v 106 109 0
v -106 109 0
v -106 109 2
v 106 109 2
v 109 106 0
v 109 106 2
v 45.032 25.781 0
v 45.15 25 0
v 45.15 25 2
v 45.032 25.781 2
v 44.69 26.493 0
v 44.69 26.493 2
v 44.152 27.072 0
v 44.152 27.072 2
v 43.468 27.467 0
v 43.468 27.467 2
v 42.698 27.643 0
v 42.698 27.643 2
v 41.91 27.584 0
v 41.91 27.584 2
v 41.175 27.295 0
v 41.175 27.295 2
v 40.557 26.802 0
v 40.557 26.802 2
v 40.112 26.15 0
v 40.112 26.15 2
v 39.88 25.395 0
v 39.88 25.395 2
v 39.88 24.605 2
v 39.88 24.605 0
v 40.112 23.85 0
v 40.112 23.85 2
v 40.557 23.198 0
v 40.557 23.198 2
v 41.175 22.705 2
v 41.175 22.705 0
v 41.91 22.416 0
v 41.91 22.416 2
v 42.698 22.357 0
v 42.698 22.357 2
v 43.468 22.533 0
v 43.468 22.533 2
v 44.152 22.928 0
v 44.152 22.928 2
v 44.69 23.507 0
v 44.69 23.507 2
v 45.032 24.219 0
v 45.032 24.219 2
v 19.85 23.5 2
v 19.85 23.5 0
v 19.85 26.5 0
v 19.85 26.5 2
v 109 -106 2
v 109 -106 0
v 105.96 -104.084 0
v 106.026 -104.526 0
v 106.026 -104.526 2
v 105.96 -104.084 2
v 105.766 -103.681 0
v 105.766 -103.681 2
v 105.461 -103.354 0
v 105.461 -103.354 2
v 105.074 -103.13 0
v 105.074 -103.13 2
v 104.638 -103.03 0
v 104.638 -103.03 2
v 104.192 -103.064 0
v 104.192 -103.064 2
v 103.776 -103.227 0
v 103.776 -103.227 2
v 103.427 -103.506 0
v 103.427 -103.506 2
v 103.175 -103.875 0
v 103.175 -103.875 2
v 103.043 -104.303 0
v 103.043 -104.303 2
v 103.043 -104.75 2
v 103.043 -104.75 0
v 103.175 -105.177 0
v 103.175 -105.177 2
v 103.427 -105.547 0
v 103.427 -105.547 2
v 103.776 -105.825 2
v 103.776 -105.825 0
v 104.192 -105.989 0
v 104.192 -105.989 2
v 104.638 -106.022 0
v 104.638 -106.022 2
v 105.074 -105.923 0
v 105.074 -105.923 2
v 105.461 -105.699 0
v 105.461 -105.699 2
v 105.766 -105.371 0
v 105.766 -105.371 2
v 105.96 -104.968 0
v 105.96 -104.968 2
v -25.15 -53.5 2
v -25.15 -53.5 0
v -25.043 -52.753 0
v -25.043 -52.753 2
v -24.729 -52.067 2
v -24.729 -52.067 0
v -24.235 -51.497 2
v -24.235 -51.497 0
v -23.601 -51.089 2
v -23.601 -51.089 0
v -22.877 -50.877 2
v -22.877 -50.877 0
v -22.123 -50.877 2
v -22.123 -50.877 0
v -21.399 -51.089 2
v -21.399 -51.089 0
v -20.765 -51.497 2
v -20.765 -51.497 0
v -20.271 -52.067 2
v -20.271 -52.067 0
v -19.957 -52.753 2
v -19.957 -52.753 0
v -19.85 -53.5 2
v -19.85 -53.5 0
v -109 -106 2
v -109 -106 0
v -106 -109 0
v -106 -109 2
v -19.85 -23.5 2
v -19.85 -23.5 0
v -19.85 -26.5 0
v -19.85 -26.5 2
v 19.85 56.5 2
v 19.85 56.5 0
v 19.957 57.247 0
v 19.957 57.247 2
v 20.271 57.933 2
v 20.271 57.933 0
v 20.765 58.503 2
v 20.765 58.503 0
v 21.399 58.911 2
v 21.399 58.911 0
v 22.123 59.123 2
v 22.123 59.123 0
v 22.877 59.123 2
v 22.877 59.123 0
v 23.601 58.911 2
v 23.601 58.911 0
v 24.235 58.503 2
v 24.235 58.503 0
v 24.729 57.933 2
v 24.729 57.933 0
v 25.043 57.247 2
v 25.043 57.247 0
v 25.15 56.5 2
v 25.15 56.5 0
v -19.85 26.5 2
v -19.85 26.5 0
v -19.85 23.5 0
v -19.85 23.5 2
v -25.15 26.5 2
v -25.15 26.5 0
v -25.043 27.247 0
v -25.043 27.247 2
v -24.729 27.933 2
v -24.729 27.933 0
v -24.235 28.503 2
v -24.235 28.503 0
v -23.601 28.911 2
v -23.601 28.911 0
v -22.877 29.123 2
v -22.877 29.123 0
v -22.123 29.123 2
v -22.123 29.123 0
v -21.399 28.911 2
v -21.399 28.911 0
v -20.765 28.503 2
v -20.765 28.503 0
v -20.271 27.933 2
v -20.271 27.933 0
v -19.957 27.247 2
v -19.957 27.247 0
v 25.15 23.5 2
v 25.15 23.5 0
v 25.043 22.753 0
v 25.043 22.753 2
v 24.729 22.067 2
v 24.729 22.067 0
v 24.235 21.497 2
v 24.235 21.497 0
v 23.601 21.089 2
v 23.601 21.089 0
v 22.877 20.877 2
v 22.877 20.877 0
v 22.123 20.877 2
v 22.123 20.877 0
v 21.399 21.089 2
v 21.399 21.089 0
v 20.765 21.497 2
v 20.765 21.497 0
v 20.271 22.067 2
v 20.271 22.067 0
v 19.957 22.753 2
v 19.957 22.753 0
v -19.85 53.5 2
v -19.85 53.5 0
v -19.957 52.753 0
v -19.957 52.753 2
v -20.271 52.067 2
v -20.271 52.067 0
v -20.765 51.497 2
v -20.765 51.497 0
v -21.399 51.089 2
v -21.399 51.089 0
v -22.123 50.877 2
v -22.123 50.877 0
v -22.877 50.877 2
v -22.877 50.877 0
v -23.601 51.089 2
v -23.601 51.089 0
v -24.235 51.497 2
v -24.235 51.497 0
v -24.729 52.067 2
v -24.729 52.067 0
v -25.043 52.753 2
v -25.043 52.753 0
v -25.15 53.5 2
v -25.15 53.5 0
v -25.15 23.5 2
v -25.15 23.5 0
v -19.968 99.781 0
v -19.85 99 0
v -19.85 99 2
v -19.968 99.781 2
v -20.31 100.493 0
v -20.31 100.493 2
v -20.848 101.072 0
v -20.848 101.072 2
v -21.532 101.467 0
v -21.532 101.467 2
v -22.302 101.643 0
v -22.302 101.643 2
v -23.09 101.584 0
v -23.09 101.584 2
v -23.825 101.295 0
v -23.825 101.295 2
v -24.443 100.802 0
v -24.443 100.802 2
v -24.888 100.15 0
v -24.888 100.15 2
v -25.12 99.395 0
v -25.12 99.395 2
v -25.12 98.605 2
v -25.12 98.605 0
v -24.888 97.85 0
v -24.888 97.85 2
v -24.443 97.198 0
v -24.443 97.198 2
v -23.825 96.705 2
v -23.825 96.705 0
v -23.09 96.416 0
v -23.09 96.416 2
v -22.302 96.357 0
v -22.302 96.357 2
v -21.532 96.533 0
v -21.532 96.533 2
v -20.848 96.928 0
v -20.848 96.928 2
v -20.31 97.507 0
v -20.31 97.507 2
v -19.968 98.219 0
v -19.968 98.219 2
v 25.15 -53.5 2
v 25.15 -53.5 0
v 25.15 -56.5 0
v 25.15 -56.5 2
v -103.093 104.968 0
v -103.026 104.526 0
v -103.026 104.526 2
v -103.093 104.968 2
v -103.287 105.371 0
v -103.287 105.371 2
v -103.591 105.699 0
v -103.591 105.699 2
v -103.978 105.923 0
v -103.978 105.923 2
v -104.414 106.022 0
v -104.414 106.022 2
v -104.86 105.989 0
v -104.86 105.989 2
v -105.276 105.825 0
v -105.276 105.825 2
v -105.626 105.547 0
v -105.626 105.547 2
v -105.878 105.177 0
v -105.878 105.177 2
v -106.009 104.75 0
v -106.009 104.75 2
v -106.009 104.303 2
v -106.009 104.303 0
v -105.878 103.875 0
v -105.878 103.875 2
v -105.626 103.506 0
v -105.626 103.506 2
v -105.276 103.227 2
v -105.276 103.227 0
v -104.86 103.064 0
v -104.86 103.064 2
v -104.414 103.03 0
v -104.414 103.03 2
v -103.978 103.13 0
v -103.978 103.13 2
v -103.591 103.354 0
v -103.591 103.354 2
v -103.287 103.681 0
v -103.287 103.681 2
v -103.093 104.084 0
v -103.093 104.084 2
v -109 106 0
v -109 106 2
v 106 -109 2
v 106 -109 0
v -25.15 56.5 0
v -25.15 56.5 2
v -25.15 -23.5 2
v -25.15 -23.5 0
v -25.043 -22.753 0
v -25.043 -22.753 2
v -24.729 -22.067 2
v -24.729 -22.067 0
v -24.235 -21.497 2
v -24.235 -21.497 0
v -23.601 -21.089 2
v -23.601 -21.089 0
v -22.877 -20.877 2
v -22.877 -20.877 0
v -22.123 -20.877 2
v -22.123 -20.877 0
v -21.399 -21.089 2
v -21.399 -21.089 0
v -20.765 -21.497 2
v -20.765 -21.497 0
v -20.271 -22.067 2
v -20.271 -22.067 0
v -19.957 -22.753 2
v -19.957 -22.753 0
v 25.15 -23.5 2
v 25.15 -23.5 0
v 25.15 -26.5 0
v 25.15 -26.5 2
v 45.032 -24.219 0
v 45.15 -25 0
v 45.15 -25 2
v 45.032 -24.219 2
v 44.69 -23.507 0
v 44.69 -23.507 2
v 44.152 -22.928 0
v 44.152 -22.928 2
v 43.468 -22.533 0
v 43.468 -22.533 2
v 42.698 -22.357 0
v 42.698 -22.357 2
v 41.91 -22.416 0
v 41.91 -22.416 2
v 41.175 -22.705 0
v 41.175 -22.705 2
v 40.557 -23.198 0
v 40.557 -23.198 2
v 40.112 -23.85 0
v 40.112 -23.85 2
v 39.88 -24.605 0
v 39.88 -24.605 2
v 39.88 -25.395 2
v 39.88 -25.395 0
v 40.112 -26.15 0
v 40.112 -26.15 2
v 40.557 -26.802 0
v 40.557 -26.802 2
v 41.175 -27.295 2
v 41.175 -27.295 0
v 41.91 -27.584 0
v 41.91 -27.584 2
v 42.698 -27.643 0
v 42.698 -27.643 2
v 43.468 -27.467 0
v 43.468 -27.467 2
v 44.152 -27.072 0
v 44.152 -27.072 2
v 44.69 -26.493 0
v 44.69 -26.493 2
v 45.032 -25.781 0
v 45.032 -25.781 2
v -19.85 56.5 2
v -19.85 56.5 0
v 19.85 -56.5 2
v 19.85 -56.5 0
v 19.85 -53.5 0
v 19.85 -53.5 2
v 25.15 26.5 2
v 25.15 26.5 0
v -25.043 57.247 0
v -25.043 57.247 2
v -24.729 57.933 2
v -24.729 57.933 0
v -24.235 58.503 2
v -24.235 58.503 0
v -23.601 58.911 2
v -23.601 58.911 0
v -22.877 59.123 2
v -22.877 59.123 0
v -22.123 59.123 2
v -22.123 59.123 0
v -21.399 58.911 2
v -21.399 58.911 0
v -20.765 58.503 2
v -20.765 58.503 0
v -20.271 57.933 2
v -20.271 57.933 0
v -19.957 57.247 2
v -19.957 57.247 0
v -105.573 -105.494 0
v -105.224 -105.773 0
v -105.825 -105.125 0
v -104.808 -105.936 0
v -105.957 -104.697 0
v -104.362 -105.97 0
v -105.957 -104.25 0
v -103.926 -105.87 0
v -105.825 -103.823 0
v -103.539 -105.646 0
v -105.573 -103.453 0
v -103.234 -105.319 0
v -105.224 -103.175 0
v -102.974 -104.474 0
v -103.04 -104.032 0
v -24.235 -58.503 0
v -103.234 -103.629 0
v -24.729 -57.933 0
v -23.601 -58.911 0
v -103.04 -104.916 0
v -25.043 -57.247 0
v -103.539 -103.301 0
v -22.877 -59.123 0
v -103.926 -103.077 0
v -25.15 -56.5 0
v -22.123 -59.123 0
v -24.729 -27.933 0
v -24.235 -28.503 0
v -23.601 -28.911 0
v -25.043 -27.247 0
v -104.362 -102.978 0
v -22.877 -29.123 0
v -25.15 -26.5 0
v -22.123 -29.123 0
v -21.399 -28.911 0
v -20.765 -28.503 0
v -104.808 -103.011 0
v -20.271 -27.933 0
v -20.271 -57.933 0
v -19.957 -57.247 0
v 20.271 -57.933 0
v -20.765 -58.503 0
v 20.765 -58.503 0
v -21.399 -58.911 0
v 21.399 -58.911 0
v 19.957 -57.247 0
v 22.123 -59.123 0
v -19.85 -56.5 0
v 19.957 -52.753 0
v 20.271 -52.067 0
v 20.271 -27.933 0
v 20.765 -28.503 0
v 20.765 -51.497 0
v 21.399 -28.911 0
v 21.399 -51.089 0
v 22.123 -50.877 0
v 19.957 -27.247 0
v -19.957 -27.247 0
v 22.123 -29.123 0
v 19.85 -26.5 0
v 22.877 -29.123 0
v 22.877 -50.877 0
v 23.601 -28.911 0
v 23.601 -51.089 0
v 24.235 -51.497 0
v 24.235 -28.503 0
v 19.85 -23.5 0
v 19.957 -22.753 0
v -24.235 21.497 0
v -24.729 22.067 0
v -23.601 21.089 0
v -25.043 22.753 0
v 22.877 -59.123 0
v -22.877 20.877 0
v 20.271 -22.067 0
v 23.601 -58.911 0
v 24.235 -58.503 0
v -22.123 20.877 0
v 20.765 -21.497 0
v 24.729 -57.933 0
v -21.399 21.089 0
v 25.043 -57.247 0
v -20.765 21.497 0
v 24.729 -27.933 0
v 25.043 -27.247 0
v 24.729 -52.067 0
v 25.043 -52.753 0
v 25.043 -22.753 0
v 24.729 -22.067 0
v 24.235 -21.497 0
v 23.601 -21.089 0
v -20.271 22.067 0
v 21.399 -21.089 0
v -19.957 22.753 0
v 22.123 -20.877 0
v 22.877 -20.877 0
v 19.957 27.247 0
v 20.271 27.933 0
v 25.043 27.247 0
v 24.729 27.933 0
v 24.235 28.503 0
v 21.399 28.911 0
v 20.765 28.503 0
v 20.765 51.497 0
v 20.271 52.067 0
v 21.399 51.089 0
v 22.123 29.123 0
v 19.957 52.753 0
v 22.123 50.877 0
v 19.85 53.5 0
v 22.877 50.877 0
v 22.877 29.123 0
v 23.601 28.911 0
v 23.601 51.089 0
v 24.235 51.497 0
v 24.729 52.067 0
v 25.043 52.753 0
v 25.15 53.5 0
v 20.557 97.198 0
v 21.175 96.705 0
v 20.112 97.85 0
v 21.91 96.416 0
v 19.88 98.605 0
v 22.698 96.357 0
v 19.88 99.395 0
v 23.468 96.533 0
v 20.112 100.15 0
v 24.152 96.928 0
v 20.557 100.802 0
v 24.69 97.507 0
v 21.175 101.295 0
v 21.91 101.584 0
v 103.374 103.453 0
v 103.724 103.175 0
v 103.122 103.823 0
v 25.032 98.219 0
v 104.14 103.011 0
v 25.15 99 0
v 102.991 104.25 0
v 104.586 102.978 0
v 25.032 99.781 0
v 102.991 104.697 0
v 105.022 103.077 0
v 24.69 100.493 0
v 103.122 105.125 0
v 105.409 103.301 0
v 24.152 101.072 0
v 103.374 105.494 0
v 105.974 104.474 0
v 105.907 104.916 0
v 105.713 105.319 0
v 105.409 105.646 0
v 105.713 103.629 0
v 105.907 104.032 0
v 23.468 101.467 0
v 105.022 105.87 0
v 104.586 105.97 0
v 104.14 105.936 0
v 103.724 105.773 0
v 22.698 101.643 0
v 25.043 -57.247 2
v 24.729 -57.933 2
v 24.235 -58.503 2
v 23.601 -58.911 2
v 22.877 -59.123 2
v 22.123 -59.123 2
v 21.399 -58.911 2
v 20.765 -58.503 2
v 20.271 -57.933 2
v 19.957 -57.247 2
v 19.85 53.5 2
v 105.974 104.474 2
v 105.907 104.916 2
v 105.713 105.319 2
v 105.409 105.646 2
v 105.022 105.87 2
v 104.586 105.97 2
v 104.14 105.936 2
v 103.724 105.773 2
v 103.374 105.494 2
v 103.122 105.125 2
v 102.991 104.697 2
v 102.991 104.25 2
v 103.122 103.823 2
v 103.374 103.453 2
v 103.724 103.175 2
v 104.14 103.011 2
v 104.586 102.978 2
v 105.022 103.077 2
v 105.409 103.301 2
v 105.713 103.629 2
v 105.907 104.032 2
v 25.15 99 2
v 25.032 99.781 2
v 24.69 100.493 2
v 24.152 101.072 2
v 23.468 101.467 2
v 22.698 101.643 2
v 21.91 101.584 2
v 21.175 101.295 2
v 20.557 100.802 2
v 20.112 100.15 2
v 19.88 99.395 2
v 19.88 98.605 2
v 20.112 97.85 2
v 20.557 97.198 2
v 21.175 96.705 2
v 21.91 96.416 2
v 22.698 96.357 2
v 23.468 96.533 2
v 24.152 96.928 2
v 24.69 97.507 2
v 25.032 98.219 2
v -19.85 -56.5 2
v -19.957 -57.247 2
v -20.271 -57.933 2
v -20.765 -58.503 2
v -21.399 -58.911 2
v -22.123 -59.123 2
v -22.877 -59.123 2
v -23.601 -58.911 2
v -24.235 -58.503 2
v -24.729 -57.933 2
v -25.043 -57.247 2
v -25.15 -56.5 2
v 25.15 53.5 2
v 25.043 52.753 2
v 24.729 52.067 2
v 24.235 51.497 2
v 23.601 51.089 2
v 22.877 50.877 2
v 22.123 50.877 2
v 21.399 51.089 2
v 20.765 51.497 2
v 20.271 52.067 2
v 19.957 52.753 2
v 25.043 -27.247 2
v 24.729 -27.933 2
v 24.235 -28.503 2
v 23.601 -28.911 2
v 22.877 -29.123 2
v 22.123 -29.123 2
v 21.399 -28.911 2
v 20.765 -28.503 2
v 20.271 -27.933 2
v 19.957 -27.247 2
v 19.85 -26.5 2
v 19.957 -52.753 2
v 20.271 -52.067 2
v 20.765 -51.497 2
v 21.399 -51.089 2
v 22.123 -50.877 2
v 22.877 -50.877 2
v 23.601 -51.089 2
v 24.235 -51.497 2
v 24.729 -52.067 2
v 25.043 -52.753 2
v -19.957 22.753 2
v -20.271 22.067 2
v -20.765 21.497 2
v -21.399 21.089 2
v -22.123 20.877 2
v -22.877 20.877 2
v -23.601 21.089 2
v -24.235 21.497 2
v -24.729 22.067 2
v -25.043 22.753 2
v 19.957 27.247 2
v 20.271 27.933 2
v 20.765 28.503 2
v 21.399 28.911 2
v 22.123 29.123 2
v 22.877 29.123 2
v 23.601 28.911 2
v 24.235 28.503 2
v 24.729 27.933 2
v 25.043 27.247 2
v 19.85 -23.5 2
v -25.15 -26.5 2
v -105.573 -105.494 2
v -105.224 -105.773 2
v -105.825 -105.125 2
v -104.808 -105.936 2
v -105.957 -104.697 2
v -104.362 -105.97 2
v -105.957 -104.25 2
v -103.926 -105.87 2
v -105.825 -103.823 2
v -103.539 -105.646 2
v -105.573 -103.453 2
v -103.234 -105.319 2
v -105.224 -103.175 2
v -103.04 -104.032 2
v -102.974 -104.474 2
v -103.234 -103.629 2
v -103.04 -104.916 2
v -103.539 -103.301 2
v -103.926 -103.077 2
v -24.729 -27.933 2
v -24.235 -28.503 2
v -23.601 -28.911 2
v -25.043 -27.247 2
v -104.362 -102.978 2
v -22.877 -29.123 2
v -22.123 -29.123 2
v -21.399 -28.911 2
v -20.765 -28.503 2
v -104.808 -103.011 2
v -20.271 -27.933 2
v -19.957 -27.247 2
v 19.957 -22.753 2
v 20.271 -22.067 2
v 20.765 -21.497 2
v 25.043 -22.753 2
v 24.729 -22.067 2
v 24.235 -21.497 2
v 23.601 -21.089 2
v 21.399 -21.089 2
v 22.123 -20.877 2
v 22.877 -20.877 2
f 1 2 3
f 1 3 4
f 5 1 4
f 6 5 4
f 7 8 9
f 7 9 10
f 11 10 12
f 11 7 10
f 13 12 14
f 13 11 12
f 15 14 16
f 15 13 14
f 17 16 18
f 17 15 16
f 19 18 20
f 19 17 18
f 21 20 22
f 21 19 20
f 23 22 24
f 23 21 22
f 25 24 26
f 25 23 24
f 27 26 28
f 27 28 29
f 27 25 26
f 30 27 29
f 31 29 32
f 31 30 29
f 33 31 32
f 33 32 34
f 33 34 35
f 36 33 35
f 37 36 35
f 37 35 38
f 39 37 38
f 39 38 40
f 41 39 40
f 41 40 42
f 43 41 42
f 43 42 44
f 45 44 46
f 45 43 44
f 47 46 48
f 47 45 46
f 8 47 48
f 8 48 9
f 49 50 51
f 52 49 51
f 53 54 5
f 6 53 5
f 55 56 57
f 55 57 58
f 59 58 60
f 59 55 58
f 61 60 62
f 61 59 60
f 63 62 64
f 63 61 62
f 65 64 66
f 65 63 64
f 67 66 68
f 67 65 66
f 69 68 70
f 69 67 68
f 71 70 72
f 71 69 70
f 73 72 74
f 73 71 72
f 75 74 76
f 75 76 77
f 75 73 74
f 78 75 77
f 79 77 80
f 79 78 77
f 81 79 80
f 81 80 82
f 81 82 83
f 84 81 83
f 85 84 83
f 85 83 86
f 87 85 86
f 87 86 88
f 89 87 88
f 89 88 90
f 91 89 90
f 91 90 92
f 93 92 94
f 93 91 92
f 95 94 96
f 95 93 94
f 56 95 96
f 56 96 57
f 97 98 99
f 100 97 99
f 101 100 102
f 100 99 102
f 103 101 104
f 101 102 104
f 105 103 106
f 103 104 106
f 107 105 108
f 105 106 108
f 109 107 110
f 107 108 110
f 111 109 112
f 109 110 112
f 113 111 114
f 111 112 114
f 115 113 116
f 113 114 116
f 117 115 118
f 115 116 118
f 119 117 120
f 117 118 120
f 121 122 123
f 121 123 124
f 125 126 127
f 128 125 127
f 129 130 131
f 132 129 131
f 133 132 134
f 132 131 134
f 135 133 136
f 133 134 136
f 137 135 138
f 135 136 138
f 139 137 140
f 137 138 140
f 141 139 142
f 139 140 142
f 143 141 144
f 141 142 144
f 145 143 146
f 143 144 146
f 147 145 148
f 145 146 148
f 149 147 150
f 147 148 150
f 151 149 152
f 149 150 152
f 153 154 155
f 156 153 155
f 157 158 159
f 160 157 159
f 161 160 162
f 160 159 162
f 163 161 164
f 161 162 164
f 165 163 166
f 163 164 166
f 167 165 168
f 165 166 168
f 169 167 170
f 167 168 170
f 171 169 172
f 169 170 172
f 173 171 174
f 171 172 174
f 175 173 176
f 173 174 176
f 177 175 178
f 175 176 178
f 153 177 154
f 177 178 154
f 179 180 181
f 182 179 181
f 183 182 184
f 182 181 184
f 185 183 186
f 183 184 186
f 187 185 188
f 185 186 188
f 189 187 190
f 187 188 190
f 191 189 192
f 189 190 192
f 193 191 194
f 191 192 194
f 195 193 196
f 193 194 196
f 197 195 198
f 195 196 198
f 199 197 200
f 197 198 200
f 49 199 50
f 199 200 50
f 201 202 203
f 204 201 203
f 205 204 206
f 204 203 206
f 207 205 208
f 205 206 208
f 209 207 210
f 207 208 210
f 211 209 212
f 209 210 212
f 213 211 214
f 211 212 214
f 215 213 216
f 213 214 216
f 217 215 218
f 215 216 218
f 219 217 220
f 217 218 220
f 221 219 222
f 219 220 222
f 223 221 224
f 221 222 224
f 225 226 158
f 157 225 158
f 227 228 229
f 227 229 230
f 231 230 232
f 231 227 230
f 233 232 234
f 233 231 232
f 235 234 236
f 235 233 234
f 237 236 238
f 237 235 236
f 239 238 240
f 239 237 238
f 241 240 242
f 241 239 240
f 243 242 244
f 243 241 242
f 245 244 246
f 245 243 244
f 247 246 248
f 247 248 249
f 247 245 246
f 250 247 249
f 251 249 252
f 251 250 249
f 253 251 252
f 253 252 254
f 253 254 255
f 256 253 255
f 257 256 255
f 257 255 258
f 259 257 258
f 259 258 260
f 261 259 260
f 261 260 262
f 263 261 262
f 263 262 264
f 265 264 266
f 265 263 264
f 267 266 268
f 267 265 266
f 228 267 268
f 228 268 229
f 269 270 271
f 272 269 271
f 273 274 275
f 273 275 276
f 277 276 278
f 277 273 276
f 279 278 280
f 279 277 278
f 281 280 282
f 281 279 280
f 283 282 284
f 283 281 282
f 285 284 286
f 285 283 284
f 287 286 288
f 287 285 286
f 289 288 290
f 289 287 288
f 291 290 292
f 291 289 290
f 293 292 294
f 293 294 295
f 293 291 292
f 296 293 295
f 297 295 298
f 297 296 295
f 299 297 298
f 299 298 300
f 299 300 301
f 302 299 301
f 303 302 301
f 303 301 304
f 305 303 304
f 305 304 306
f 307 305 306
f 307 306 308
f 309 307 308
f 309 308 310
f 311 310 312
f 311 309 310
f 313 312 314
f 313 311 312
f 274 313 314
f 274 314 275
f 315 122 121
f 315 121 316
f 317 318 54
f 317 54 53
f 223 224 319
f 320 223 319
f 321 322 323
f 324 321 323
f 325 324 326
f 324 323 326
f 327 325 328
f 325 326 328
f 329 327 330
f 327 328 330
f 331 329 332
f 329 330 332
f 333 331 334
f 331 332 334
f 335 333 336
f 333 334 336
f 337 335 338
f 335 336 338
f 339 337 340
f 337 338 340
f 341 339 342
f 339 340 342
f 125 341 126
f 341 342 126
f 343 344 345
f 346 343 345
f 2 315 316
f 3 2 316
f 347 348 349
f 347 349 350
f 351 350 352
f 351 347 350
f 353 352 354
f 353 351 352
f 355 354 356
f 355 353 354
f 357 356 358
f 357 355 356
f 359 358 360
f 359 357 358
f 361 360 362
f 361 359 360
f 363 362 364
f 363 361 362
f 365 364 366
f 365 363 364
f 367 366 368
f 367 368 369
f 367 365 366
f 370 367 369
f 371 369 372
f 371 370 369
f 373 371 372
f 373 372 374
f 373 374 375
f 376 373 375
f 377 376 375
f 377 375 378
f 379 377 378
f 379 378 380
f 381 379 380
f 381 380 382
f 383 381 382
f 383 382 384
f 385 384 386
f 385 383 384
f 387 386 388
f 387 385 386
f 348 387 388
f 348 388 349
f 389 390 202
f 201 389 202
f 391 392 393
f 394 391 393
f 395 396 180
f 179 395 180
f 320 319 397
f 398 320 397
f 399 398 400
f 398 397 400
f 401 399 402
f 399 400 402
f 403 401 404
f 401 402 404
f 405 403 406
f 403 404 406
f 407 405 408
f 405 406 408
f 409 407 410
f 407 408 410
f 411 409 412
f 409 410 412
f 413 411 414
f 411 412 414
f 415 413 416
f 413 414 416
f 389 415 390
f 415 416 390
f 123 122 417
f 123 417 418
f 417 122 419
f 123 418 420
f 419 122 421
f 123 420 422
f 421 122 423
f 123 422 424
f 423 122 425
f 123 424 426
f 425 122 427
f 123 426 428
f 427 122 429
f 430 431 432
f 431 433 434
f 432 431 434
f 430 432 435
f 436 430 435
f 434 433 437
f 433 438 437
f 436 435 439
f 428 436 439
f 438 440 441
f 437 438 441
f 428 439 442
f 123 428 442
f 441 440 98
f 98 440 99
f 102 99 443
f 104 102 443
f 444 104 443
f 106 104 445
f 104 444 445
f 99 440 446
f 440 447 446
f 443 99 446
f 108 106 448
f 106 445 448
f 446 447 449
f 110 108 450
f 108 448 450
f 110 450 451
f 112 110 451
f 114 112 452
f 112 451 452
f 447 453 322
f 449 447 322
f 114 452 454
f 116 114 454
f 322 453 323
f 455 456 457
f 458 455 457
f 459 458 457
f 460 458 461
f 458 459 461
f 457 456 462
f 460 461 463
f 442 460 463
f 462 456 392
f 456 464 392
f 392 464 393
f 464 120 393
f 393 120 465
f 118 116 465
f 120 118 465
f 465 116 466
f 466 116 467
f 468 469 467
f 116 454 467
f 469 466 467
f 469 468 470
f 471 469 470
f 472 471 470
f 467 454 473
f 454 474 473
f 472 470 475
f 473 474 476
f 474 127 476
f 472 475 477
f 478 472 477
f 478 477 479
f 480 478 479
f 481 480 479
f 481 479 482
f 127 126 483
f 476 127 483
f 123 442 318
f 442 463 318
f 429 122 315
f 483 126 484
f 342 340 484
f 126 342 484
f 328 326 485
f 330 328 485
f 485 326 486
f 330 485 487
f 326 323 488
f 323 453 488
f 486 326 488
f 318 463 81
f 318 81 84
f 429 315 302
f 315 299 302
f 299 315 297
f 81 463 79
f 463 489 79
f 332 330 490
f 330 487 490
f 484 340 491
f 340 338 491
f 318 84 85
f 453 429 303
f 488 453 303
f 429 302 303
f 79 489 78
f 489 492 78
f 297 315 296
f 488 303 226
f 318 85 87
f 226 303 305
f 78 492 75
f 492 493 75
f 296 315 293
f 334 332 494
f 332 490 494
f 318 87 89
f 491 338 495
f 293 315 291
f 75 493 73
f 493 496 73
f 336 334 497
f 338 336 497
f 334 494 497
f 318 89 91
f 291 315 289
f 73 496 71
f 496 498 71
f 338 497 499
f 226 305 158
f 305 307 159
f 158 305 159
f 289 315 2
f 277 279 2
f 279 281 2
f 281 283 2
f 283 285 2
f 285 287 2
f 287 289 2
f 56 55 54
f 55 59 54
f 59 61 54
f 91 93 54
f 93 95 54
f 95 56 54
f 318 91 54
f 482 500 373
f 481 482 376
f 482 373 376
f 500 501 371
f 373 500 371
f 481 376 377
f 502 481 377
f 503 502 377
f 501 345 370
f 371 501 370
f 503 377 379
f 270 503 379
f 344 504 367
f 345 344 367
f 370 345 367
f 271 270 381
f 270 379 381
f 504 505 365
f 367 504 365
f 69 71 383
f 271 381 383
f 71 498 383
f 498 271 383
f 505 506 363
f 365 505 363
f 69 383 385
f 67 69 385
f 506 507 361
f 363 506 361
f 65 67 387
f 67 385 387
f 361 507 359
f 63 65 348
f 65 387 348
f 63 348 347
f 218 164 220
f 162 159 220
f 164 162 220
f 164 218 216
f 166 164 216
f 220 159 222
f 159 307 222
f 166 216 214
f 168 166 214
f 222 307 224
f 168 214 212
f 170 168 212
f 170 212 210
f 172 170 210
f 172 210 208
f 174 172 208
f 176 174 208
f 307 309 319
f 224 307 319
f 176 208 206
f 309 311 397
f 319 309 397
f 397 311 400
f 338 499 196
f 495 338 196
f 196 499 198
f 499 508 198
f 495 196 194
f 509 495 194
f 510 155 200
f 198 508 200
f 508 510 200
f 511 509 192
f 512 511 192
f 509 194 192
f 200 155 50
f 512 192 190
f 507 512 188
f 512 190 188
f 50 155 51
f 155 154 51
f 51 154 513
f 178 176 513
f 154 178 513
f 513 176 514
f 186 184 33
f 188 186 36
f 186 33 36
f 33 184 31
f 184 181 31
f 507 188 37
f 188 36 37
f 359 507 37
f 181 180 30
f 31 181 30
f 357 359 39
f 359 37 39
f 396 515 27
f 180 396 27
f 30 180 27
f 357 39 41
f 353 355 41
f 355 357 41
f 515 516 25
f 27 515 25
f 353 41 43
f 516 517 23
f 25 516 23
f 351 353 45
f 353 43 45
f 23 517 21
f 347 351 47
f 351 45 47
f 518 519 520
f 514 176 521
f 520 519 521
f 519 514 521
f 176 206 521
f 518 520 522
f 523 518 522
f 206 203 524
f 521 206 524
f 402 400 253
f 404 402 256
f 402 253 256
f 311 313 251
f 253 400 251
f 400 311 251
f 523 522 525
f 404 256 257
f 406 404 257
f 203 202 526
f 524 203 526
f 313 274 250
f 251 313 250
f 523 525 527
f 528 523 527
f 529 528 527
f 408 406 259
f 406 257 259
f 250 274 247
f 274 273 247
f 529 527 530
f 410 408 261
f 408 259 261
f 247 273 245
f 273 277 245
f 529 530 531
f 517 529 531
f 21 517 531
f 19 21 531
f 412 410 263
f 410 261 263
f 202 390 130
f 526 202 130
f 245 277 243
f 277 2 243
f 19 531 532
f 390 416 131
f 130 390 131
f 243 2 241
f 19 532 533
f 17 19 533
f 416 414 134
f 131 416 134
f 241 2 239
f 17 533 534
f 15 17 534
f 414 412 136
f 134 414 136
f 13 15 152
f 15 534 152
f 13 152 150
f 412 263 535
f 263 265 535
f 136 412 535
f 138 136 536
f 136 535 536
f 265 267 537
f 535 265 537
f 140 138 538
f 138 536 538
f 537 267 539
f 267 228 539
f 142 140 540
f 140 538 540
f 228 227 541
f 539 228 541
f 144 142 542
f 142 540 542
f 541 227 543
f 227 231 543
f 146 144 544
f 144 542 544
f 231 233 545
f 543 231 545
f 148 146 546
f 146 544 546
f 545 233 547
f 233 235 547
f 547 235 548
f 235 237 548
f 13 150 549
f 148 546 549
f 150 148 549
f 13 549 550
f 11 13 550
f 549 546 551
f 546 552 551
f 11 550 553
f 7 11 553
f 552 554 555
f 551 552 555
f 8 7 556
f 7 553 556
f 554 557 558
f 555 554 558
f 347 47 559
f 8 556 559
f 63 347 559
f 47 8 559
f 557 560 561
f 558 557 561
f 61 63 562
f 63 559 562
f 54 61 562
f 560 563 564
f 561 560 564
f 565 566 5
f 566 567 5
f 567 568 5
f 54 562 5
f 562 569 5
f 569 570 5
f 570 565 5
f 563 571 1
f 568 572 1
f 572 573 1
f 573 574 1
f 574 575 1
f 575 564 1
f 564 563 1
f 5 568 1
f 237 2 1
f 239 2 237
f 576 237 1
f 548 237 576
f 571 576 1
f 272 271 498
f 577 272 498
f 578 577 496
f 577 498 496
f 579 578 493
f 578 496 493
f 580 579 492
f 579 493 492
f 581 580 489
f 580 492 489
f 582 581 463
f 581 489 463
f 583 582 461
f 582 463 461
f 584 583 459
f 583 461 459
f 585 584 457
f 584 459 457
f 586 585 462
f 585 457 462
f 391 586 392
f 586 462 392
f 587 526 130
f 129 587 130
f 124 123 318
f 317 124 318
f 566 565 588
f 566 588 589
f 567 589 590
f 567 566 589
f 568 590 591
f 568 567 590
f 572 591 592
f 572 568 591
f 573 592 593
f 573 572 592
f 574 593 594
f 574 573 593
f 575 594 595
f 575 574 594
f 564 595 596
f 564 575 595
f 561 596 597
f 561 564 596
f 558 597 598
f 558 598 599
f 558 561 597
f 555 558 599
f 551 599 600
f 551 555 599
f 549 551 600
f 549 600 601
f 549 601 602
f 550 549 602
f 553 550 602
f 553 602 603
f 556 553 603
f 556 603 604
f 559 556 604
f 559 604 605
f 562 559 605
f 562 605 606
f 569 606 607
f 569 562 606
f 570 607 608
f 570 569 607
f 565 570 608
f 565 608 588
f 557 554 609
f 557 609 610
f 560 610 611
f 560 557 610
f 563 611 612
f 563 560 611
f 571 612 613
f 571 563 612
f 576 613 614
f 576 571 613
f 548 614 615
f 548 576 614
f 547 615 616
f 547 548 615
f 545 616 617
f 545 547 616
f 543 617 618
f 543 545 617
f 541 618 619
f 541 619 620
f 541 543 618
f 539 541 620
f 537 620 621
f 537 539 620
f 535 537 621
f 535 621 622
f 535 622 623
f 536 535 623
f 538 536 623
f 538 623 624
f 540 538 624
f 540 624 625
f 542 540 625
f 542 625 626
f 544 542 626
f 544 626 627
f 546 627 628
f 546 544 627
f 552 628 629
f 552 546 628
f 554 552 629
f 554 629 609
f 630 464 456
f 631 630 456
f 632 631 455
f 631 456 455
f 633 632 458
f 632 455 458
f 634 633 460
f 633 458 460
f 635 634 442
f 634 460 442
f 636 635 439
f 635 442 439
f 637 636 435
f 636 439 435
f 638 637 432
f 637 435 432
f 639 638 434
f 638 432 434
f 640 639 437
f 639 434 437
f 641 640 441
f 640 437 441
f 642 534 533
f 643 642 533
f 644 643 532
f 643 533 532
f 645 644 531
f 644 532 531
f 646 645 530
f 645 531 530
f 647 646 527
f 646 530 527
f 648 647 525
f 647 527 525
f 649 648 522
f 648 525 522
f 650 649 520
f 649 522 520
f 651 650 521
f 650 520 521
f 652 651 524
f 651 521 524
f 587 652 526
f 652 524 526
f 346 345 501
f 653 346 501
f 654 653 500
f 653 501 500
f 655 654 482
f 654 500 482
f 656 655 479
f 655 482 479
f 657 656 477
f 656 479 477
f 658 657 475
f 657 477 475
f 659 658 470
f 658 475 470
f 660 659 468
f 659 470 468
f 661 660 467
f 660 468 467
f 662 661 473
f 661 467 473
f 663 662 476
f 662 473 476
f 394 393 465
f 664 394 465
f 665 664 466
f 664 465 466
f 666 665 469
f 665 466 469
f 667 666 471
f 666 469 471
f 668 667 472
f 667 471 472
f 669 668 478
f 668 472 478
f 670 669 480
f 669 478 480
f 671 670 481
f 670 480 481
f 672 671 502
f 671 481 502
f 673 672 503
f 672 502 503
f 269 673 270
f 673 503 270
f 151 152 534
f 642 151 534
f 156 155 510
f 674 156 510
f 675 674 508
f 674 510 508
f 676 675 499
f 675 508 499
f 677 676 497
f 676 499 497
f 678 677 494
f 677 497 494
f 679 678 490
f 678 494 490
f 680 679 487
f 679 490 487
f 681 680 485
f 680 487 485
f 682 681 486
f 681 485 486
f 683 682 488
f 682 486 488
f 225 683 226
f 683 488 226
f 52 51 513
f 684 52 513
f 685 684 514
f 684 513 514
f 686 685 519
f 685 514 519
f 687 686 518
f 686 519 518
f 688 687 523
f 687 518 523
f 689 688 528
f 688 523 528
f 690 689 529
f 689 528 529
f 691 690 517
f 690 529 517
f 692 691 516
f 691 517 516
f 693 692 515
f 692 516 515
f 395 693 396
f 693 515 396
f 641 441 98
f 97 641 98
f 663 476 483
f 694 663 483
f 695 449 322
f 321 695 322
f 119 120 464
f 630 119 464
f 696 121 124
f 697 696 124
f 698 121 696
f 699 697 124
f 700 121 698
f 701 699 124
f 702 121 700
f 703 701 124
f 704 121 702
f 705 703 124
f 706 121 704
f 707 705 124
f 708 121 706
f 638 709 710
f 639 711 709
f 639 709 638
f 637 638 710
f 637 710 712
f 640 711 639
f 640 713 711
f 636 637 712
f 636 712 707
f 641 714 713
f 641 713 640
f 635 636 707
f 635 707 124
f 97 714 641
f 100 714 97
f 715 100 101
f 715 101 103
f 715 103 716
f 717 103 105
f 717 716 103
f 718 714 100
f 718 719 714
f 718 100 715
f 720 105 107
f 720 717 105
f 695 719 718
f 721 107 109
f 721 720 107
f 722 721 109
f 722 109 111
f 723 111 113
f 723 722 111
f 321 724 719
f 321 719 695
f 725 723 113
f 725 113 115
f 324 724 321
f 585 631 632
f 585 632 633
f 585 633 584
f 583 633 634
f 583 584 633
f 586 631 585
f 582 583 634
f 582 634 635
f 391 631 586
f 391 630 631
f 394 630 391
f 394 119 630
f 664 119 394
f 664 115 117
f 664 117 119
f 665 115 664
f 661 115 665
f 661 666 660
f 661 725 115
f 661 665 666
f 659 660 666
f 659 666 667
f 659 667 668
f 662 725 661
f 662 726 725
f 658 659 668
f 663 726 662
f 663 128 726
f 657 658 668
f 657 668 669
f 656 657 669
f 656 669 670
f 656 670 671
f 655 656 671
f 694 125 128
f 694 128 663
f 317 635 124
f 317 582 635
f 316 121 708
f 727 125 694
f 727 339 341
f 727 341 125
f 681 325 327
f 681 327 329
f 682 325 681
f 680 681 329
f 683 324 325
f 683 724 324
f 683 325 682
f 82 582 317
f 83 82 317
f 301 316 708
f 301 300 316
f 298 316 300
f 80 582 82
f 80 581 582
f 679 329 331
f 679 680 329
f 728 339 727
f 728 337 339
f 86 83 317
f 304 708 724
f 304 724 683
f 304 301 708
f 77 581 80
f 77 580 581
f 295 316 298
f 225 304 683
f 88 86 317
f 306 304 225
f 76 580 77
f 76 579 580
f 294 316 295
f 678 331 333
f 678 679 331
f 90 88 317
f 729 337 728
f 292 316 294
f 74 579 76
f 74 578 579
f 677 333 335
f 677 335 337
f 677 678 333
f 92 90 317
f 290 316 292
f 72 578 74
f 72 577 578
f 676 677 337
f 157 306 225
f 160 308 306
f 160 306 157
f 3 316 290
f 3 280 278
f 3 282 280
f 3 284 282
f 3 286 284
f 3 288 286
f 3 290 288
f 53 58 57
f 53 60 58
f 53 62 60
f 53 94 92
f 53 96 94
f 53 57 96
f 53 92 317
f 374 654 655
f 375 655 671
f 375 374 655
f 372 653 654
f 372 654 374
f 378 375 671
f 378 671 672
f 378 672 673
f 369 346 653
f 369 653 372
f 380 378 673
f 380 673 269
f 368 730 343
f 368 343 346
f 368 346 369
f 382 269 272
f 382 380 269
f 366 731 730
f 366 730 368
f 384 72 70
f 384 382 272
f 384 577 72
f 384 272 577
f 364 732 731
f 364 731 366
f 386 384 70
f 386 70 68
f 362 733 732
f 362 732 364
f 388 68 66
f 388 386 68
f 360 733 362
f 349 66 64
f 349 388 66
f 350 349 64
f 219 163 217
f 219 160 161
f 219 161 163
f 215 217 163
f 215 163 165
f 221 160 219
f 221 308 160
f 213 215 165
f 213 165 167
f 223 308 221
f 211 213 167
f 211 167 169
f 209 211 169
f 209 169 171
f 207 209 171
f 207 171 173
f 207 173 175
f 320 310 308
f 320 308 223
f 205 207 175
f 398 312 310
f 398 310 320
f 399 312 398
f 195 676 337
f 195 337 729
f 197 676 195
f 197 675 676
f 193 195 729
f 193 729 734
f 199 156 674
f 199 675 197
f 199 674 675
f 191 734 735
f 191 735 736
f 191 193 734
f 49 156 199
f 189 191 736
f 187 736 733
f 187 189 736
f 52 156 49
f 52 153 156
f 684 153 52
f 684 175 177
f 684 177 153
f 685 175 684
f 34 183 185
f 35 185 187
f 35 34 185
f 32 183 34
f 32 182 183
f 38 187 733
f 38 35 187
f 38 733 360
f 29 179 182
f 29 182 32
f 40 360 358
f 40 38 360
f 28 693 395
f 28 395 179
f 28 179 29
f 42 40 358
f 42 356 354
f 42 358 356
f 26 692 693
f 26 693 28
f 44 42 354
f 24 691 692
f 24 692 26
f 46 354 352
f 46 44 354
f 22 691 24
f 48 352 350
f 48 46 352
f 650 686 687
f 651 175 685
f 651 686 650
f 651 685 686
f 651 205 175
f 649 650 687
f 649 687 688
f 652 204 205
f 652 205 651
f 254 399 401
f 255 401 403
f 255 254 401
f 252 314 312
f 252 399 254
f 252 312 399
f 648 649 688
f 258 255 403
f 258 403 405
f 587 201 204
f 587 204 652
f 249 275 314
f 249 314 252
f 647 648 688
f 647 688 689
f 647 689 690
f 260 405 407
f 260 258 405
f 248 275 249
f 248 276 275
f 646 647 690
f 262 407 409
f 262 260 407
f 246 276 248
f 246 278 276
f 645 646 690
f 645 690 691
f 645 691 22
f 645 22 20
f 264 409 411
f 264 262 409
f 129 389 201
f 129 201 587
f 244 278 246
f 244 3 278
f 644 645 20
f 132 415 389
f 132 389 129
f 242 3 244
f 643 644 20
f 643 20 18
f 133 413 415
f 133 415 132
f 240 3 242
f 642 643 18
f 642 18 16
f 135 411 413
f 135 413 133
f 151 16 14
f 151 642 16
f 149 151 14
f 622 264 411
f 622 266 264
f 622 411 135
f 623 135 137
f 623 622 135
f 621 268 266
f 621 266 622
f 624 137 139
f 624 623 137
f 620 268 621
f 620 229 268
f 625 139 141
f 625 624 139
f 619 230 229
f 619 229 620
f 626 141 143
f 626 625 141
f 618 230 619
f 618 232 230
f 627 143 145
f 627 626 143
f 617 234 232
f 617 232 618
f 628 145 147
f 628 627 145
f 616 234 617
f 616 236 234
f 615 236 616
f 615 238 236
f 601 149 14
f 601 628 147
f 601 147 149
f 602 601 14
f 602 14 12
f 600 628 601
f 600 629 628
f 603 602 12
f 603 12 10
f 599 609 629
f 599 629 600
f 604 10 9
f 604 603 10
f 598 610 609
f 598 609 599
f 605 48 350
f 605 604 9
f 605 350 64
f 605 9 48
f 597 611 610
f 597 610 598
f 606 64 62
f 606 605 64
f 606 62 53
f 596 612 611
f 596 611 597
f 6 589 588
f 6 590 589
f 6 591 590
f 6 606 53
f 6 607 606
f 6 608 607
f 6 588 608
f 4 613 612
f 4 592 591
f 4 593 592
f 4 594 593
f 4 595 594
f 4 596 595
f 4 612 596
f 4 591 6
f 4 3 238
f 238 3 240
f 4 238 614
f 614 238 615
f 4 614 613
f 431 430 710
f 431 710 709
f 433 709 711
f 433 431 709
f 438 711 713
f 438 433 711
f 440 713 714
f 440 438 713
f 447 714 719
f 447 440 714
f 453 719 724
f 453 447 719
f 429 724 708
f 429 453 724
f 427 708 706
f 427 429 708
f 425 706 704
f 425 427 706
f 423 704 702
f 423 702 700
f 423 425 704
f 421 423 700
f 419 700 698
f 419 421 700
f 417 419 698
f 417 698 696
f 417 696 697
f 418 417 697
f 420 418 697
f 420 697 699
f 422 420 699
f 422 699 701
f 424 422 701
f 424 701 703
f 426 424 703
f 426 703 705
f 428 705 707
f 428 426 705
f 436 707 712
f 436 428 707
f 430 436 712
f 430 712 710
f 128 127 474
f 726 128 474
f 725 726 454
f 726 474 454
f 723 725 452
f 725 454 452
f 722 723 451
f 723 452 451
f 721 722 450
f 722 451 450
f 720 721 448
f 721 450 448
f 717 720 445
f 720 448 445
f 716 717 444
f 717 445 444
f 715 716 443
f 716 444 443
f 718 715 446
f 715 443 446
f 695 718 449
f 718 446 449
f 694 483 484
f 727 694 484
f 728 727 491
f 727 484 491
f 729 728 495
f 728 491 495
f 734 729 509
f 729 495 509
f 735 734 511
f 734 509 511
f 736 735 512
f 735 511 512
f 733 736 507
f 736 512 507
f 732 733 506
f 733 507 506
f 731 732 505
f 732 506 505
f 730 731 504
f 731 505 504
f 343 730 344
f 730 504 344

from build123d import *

# Parameters (mm, degrees)
SKETCH1_W           = 218
SKETCH1_H           = 218
SKETCH1_R           = 1.5
SKETCH1_R_2         = 2.65
BOSS_EXTRUDE1_DEPTH = 2
CHAMFER1_SIZE       = 3


with BuildPart() as part:
    # Sketch1 → Boss-Extrude1 (new body)
    with BuildSketch(Plane.XY):
        Rectangle(SKETCH1_W, SKETCH1_H)
        with Locations((-104.526250503, 104.526250503)):
            Circle(SKETCH1_R, mode=Mode.SUBTRACT)
        with Locations((104.473749497, 104.473749497)):
            Circle(SKETCH1_R, mode=Mode.SUBTRACT)
        with Locations((104.526250503, -104.526250503)):
            Circle(SKETCH1_R, mode=Mode.SUBTRACT)
        with Locations((-104.473749497, -104.473749497)):
            Circle(SKETCH1_R, mode=Mode.SUBTRACT)
        with Locations((42.5, 25)):
            Circle(SKETCH1_R_2, mode=Mode.SUBTRACT)
        with Locations((42.5, -25)):
            Circle(SKETCH1_R_2, mode=Mode.SUBTRACT)
        with Locations((-22.5, 99)):
            Circle(SKETCH1_R_2, mode=Mode.SUBTRACT)
        with Locations((22.5, 99)):
            Circle(SKETCH1_R_2, mode=Mode.SUBTRACT)
        with BuildLine():
            Line((-19.85, 56.5), (-19.85, 53.5))
            ThreePointArc((-19.85, 53.5), (-22.5, 50.85), (-25.15, 53.5))
            Line((-25.15, 53.5), (-25.15, 56.5))
            ThreePointArc((-25.15, 56.5), (-22.5, 59.15), (-19.85, 56.5))
        make_face(mode=Mode.SUBTRACT)
        with BuildLine():
            Line((-25.15, 23.5), (-25.15, 26.5))
            ThreePointArc((-25.15, 26.5), (-22.5, 29.15), (-19.85, 26.5))
            Line((-19.85, 26.5), (-19.85, 23.5))
            ThreePointArc((-19.85, 23.5), (-22.5, 20.85), (-25.15, 23.5))
        make_face(mode=Mode.SUBTRACT)
        with BuildLine():
            Line((25.15, 56.5), (25.15, 53.5))
            ThreePointArc((25.15, 53.5), (22.5, 50.85), (19.85, 53.5))
            Line((19.85, 53.5), (19.85, 56.5))
            ThreePointArc((19.85, 56.5), (22.5, 59.15), (25.15, 56.5))
        make_face(mode=Mode.SUBTRACT)
        with BuildLine():
            Line((19.85, 23.5), (19.85, 26.5))
            ThreePointArc((19.85, 26.5), (22.5, 29.15), (25.15, 26.5))
            Line((25.15, 26.5), (25.15, 23.5))
            ThreePointArc((25.15, 23.5), (22.5, 20.85), (19.85, 23.5))
        make_face(mode=Mode.SUBTRACT)
        with BuildLine():
            Line((25.15, -23.5), (25.15, -26.5))
            ThreePointArc((25.15, -26.5), (22.5, -29.15), (19.85, -26.5))
            Line((19.85, -26.5), (19.85, -23.5))
            ThreePointArc((19.85, -23.5), (22.5, -20.85), (25.15, -23.5))
        make_face(mode=Mode.SUBTRACT)
        with BuildLine():
            Line((19.85, -56.5), (19.85, -53.5))
            ThreePointArc((19.85, -53.5), (22.5, -50.85), (25.15, -53.5))
            Line((25.15, -53.5), (25.15, -56.5))
            ThreePointArc((25.15, -56.5), (22.5, -59.15), (19.85, -56.5))
        make_face(mode=Mode.SUBTRACT)
        with BuildLine():
            Line((-19.85, -23.5), (-19.85, -26.5))
            ThreePointArc((-19.85, -26.5), (-22.5, -29.15), (-25.15, -26.5))
            Line((-25.15, -26.5), (-25.15, -23.5))
            ThreePointArc((-25.15, -23.5), (-22.5, -20.85), (-19.85, -23.5))
        make_face(mode=Mode.SUBTRACT)
        with BuildLine():
            Line((-25.15, -56.5), (-25.15, -53.5))
            ThreePointArc((-25.15, -53.5), (-22.5, -50.85), (-19.85, -53.5))
            Line((-19.85, -53.5), (-19.85, -56.5))
            ThreePointArc((-19.85, -56.5), (-22.5, -59.15), (-25.15, -56.5))
        make_face(mode=Mode.SUBTRACT)
    extrude(amount=BOSS_EXTRUDE1_DEPTH)

    # Chamfer1
    chamfer1_edges = [part.edges().sort_by_distance(p)[0] for p in [
        (109, -109, 1),
        (-109, -109, 1),
        (-109, 109, 1),
        (109, 109, 1),
    ]]
    chamfer(chamfer1_edges, length=CHAMFER1_SIZE)


solid = part.part
